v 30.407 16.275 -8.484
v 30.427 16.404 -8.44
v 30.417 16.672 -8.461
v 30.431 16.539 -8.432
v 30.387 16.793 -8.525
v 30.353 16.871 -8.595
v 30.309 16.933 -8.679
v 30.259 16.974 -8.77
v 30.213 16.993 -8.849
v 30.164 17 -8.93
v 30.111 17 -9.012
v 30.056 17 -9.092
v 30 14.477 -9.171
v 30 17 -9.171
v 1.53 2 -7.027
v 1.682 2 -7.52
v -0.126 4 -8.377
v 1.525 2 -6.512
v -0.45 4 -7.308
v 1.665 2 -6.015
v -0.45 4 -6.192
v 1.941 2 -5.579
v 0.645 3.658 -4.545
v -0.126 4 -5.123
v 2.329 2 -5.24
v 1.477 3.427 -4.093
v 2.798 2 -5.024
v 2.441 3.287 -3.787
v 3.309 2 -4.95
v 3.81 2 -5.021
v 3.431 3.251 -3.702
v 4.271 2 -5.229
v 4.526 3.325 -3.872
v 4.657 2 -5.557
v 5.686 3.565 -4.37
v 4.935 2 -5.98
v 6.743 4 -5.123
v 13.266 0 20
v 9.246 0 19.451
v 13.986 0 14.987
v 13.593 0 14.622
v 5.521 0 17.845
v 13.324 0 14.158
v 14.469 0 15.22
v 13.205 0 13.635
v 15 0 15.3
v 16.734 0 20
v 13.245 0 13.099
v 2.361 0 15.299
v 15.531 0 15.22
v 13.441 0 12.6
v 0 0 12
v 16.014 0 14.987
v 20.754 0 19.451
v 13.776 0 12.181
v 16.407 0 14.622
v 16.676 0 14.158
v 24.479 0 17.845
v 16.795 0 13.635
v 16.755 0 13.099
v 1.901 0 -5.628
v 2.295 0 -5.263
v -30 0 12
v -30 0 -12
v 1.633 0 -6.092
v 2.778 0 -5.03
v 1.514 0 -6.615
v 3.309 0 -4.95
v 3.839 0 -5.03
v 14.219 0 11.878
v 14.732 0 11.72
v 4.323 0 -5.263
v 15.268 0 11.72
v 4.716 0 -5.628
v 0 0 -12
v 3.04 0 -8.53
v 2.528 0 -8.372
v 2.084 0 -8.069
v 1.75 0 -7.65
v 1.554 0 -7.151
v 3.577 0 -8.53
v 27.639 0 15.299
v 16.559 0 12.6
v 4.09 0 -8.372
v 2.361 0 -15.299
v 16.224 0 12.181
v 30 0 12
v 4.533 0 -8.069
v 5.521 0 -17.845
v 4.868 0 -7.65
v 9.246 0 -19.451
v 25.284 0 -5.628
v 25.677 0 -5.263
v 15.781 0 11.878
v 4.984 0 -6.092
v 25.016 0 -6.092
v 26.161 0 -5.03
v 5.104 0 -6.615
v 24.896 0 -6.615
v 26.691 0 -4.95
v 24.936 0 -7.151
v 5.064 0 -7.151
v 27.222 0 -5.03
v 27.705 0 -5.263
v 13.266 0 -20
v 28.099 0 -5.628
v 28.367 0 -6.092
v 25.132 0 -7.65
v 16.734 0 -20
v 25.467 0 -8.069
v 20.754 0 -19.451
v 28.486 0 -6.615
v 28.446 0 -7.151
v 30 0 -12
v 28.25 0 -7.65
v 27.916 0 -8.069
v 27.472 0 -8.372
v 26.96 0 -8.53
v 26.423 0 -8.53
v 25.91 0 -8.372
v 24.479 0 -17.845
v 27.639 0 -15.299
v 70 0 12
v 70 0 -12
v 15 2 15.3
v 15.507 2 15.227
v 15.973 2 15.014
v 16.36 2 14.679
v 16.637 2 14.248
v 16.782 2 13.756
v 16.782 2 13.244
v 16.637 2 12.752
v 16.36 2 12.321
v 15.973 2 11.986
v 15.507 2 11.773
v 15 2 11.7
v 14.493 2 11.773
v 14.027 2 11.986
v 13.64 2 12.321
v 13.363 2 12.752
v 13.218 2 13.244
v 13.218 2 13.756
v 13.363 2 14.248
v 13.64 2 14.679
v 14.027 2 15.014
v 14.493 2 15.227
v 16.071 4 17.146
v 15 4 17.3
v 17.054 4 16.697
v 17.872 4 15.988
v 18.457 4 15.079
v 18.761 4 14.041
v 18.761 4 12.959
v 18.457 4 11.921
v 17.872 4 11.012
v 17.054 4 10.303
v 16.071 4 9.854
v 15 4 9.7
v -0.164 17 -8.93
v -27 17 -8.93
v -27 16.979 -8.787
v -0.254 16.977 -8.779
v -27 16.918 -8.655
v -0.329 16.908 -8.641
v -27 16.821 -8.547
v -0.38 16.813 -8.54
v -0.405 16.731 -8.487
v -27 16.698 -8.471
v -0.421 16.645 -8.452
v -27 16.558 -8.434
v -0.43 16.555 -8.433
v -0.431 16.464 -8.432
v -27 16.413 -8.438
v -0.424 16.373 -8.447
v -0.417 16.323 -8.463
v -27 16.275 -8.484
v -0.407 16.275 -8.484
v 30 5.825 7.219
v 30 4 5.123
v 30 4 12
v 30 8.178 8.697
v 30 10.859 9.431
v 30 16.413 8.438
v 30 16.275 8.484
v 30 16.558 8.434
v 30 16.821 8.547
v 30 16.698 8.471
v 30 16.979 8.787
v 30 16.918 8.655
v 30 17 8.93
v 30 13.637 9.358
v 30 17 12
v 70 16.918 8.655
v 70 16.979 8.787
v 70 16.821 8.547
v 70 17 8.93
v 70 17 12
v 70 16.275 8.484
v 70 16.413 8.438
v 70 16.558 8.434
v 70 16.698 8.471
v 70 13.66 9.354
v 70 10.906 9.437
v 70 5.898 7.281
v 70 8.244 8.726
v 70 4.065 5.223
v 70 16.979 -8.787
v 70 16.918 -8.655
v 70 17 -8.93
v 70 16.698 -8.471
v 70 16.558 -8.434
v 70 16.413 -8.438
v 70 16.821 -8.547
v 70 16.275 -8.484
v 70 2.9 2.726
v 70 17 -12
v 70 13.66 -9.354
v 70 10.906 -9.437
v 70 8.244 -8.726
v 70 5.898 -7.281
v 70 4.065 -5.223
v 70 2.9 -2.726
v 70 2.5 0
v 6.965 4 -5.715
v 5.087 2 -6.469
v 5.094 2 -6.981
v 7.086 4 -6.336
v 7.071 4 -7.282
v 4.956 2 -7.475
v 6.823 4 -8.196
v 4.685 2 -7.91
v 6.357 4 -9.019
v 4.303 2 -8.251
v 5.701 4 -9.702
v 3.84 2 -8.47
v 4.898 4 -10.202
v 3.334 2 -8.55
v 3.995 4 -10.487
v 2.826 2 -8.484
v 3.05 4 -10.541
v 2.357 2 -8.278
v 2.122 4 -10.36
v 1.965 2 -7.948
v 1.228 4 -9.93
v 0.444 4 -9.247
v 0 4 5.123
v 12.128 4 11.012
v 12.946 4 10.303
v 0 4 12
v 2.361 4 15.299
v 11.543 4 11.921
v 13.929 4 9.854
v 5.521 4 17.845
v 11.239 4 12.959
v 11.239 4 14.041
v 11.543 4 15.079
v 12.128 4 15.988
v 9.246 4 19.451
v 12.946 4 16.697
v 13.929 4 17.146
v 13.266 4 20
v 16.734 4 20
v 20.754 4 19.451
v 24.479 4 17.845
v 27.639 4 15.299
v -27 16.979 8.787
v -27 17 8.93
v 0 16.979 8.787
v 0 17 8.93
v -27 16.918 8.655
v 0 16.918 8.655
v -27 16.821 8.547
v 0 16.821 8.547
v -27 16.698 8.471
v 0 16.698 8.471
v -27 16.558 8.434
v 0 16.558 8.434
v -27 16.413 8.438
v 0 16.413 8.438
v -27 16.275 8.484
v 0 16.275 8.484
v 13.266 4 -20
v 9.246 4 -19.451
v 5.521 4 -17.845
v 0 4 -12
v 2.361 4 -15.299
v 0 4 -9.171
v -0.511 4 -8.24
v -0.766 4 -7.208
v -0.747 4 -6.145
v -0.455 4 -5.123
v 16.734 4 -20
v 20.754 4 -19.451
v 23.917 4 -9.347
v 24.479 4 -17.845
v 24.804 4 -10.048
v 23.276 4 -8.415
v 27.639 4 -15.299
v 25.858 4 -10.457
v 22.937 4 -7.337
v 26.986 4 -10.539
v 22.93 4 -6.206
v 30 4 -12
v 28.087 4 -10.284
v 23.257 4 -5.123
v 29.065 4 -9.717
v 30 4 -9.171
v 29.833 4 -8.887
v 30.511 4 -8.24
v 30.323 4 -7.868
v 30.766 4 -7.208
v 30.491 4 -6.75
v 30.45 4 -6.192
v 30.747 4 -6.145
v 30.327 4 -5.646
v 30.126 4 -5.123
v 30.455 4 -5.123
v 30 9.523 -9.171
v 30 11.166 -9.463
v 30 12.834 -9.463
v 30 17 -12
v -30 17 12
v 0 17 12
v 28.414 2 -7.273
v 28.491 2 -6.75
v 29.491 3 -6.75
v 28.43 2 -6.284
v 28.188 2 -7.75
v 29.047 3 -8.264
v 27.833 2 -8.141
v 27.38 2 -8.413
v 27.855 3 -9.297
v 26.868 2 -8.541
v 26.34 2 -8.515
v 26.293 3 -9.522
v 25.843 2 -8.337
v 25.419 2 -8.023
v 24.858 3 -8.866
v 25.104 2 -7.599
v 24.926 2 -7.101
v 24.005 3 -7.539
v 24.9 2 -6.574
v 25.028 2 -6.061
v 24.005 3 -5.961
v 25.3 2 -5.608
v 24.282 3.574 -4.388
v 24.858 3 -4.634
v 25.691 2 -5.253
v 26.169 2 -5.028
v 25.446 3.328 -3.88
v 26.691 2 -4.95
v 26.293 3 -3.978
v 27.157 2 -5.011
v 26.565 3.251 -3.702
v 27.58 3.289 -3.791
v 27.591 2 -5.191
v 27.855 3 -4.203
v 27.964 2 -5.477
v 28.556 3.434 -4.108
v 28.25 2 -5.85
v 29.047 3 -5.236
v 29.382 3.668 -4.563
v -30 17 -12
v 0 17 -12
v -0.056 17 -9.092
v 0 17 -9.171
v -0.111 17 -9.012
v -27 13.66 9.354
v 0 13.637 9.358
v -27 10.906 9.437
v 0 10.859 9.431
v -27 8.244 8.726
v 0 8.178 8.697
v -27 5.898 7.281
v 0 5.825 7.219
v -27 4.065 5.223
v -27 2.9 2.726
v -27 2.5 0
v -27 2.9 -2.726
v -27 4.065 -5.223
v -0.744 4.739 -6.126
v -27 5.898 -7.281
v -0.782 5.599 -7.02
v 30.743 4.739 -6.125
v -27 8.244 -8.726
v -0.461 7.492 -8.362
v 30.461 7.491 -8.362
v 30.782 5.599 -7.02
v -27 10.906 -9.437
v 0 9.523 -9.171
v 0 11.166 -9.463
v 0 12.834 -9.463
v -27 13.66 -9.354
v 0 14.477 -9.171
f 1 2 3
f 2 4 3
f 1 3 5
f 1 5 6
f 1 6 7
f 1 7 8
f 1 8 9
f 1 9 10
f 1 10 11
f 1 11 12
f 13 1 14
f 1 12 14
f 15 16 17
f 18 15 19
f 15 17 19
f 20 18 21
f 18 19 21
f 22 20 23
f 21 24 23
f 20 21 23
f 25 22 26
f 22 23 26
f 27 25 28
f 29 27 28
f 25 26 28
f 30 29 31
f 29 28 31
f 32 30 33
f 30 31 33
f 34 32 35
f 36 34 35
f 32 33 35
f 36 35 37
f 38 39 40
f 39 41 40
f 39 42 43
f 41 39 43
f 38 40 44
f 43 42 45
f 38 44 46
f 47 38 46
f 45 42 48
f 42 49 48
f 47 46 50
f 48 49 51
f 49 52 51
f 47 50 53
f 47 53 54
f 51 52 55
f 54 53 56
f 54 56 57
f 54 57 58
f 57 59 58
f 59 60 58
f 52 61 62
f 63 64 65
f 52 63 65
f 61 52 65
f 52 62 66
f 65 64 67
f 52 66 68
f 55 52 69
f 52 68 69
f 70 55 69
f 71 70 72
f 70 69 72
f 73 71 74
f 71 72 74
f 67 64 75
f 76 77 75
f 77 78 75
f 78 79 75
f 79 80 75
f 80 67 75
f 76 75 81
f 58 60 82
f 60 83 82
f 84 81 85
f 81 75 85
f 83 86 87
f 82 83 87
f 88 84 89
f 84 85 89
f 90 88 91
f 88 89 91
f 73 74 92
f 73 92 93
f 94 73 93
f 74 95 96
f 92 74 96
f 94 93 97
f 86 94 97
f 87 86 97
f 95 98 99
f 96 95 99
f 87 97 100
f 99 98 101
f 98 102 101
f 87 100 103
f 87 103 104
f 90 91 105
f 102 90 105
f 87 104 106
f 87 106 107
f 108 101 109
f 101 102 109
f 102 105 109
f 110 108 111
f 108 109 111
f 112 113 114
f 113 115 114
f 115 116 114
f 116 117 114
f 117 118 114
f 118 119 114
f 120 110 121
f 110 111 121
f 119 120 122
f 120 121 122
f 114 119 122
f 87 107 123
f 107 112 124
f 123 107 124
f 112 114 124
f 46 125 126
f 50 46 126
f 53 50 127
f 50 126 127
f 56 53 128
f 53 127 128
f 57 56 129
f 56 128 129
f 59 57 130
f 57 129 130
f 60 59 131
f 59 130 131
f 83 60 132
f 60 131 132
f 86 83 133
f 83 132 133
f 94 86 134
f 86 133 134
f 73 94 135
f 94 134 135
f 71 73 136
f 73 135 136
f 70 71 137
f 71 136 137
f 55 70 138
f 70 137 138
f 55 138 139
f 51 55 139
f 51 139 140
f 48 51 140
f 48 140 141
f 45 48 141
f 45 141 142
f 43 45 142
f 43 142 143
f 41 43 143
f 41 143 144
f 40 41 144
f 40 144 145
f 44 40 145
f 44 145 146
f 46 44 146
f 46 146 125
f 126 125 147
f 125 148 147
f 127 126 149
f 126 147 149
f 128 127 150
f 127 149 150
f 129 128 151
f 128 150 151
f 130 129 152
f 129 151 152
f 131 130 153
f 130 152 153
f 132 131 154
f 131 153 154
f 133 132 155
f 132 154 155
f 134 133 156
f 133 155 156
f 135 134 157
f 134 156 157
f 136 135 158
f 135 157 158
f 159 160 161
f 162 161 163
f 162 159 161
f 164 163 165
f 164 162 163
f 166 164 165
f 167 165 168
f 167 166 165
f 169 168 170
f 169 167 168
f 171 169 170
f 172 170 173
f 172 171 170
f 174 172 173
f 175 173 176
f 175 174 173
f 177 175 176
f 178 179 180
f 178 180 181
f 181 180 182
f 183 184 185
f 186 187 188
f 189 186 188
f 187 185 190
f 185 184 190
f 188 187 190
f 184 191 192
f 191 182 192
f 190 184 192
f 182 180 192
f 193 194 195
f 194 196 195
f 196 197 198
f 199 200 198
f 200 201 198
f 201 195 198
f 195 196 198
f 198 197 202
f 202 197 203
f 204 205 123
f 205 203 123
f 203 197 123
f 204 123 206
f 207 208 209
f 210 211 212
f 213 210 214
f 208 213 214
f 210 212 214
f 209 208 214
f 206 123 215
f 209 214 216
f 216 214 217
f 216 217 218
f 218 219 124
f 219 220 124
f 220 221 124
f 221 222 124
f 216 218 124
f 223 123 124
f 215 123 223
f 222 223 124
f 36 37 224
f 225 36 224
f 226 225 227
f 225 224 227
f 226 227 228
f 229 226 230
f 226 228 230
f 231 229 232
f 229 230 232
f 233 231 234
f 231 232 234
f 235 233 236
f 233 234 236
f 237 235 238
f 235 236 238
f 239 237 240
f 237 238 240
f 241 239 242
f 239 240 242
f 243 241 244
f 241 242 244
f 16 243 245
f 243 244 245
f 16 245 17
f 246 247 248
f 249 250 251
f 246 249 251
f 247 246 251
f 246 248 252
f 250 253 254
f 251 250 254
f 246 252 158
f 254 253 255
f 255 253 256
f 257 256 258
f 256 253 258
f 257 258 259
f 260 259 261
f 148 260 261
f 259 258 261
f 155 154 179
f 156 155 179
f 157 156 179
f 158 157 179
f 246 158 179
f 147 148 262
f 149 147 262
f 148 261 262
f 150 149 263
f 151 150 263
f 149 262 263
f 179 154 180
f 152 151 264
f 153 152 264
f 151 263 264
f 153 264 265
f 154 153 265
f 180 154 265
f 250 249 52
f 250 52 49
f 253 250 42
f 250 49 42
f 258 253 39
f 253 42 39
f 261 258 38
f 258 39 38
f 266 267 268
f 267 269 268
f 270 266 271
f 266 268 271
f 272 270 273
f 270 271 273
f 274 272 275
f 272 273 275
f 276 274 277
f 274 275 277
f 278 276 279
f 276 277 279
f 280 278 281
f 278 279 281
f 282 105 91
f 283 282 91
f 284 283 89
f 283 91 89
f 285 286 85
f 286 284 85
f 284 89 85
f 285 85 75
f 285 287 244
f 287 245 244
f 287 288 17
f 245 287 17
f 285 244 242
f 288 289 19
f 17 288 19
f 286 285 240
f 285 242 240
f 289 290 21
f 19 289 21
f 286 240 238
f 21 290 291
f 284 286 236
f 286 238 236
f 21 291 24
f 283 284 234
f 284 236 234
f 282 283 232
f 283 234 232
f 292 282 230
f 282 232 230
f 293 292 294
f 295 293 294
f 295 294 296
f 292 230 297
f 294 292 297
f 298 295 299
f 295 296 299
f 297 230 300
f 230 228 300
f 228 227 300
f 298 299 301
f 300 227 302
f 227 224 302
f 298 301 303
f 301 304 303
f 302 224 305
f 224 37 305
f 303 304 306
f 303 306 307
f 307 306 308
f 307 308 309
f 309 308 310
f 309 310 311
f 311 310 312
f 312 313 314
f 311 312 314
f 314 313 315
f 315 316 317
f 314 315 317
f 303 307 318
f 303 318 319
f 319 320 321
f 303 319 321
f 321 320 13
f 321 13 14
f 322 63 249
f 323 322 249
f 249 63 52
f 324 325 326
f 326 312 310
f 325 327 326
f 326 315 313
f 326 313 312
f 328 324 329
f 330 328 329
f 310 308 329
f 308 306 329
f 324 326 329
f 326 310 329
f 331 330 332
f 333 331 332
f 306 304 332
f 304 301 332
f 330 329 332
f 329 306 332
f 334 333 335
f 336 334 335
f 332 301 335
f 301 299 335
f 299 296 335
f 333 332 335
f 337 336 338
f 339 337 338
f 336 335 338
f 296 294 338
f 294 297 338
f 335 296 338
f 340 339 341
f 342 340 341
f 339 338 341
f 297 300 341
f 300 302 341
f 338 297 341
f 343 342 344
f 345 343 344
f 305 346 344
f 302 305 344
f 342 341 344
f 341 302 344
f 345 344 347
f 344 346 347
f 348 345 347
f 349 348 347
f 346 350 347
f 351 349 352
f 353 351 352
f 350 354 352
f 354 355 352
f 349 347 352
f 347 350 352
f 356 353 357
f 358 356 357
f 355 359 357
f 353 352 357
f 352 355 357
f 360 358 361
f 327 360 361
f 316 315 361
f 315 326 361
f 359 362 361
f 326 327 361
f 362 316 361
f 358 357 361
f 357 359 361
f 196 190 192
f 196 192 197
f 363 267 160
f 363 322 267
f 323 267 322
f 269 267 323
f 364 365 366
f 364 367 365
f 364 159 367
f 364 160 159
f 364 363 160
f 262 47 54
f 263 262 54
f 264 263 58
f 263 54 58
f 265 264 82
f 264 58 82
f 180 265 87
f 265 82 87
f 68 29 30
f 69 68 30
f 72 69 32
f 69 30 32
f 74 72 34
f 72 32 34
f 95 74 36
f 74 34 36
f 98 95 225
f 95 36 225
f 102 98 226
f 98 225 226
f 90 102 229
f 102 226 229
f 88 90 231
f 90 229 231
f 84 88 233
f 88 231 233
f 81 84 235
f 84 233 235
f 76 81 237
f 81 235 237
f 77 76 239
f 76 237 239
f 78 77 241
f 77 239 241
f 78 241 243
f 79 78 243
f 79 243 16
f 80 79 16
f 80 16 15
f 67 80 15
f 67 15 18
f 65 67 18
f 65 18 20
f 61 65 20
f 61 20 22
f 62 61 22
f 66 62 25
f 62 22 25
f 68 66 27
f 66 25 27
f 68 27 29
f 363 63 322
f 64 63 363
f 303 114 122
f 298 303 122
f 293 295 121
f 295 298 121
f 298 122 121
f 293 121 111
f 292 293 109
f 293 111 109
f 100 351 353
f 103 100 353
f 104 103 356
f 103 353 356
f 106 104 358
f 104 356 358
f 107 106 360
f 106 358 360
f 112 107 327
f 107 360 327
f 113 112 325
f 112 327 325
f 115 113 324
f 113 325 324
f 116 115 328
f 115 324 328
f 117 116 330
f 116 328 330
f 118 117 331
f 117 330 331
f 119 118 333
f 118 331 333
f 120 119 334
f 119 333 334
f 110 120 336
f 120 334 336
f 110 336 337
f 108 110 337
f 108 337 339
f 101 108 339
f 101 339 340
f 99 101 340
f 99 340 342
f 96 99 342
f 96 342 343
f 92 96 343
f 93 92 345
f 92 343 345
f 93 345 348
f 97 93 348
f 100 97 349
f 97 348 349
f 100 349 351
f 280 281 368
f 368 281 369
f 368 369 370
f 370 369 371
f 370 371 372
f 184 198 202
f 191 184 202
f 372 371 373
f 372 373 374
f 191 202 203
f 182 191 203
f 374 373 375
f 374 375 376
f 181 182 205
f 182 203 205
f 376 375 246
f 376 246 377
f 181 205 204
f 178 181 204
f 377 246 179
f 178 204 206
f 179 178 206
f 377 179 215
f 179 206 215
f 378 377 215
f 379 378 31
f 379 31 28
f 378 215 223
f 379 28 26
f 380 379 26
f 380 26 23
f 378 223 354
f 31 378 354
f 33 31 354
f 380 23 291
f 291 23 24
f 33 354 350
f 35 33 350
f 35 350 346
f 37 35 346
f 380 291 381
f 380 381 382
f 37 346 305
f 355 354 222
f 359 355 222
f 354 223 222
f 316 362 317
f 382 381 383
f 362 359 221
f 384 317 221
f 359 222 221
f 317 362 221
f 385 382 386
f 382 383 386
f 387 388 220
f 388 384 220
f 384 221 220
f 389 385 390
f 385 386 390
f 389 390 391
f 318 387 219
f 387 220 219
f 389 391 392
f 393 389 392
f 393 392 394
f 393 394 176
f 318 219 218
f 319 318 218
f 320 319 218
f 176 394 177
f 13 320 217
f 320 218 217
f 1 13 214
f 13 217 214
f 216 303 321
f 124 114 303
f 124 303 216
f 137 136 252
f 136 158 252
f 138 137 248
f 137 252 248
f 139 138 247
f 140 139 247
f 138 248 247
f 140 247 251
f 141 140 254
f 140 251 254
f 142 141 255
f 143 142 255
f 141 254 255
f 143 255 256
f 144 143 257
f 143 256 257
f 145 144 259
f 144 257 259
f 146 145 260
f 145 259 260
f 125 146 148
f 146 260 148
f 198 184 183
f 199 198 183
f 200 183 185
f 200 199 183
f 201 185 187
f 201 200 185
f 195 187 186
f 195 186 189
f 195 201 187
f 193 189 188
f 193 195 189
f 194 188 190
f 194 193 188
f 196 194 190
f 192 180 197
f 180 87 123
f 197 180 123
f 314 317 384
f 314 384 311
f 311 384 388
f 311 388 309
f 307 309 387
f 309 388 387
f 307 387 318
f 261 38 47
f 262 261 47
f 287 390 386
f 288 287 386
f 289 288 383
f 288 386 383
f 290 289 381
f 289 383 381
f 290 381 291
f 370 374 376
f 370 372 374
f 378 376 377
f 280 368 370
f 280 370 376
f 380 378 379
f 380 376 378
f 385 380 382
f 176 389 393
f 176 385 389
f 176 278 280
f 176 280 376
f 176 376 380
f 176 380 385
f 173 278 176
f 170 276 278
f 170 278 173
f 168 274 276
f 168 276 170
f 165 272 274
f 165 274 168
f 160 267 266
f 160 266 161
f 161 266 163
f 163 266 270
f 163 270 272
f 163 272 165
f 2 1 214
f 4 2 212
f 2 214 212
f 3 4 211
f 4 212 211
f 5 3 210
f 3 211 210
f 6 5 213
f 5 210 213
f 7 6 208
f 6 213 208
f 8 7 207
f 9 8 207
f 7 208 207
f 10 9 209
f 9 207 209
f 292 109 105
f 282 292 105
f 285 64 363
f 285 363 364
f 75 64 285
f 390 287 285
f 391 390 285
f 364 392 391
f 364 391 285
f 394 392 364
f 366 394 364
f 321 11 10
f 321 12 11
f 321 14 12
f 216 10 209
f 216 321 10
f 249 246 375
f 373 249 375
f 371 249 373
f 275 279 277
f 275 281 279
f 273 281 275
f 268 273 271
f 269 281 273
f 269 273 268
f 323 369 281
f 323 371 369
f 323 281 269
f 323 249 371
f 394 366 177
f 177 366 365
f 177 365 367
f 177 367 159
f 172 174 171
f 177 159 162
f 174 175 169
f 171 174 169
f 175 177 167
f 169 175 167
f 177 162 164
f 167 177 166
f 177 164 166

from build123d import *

# Parameters (mm, degrees)
EXTRUDE_2_DEPTH     = 4
SKETCH_7_W          = 100
SKETCH_7_H          = 24
EXTRUDE_3_DEPTH     = 13
SKETCH_8_R          = 9.5
CUT_EXTRUDE_3_DEPTH = 97
SKETCH_9_W          = 30
SKETCH_9_H          = 13
CUT_EXTRUDE_4_DEPTH = 79.822585596
SKETCH_10_R         = 1.8
CUT_EXTRUDE_5_DEPTH = 74.952687578
FILLET_3_R          = 15
FILLET_4_R          = 0.5
CUT_EXTRUDE_9_REACH = 76.76
SKETCH_11_R         = 4.1


with BuildPart() as part:
    # Эскиз6 → Бобышка-Вытянуть2 (new body)
    with BuildSketch(Plane(origin=(0, 0, 0), x_dir=(1, 0, 0), z_dir=(0, 1, 0))):
        Polygon((0, 20), (0, 12), (-30, 12), (-30, -12), (0, -12), (0, -20), (30, -20), (30, -12), (70, -12), (70, 12), (30, 12), (30, 20), align=None)
    extrude(amount=EXTRUDE_2_DEPTH)

    # Эскиз7 → Бобышка-Вытянуть3 (add)
    with BuildSketch(Plane(origin=(0, 4, 0), x_dir=(1, 0, 0), z_dir=(0, 1, 0))):
        with Locations((20, 0)):
            Rectangle(SKETCH_7_W, SKETCH_7_H)
    extrude(amount=EXTRUDE_3_DEPTH)

    # Эскиз8 → Вырез-Вытянуть3 (cut)
    with BuildSketch(Plane(origin=(70, 0, 0), x_dir=(0, 0, -1), z_dir=(1, 0, 0))):
        with Locations((0, 12)):
            Circle(SKETCH_8_R)
    extrude(amount=-CUT_EXTRUDE_3_DEPTH, mode=Mode.SUBTRACT)

    # Эскиз9 → Вырез-Вытянуть4 (cut, through all)
    with BuildSketch(Plane.XY.offset(12)):
        with Locations((15, 10.5)):
            Rectangle(SKETCH_9_W, SKETCH_9_H)
    extrude(amount=-CUT_EXTRUDE_4_DEPTH, mode=Mode.SUBTRACT)

    # Эскиз10 → Вырез-Вытянуть5 (cut, through all)
    with BuildSketch(Plane(origin=(0, 4, 0), x_dir=(1, 0, 0), z_dir=(0, 1, 0))):
        with Locations(Location((15, -13.5, 0), (0, 0, 270))):
            Circle(SKETCH_10_R)
        with Locations(Location((3.308657049, 6.75, 0), (0, 0, 270))):
            Circle(SKETCH_10_R)
        with Locations(Location((26.691342951, 6.75, 0), (0, 0, 270))):
            Circle(SKETCH_10_R)
    extrude(amount=-CUT_EXTRUDE_5_DEPTH, mode=Mode.SUBTRACT)

    # Скругление3
    # the kernel refuses this fillet: 15 mm, written as the material it takes off along each edge
    with BuildSketch(Plane(origin=(30, -33.166247904, -20), x_dir=(-1, 0, 0), z_dir=(0, 1, 0))) as fillet_3_piece_1:
        with BuildLine():
            CenterArc((13.266499161, 15), FILLET_3_R, 207.818139285, 62.181860715)
            Line((0, 8), (-0.265329983, 7.86))
            ThreePointArc((-0.265329983, 7.86), (-0.3, 4), (-0.3, 0))
            Line((-0.3, 0), (0, -0.3))
            Line((0, -0.3), (13.266499161, -0.3))
            Line((13.266499161, -0.3), (13.266499161, 0))
        make_face()
    extrude(amount=70.332495807, mode=Mode.SUBTRACT)
    with BuildSketch(Plane(origin=(0, -33.166247904, -20), x_dir=(0, 0, 1), z_dir=(0, 1, 0))) as fillet_3_piece_2:
        with BuildLine():
            CenterArc((15, 13.266499161), FILLET_3_R, 180, 62.181860715)
            Line((0, 13.266499161), (-0.3, 13.266499161))
            Line((-0.3, 13.266499161), (-0.3, 0))
            Line((-0.3, 0), (0, -0.3))
            ThreePointArc((0, -0.3), (4, -0.3), (7.86, -0.265329983))
            Line((7.86, -0.265329983), (8, 0))
        make_face()
    extrude(amount=70.332495807, mode=Mode.SUBTRACT)
    with BuildSketch(Plane(origin=(30, -33.166247904, 20), x_dir=(-1, 0, 0), z_dir=(0, 1, 0))) as fillet_3_piece_3:
        with BuildLine():
            CenterArc((13.266499161, -15), FILLET_3_R, 90, 62.181860715)
            Line((0, -8), (-0.265329983, -7.86))
            ThreePointArc((-0.265329983, -7.86), (-0.3, -4), (-0.3, 0))
            Line((-0.3, 0), (0, 0.3))
            Line((0, 0.3), (13.266499161, 0.3))
            Line((13.266499161, 0.3), (13.266499161, 0))
        make_face()
    extrude(amount=70.332495807, mode=Mode.SUBTRACT)
    with BuildSketch(Plane(origin=(0, -33.166247904, 20), x_dir=(0, 0, -1), z_dir=(0, 1, 0))) as fillet_3_piece_4:
        with BuildLine():
            CenterArc((15, -13.266499161), FILLET_3_R, 117.818139285, 62.181860715)
            Line((0, -13.266499161), (-0.3, -13.266499161))
            Line((-0.3, -13.266499161), (-0.3, 0))
            Line((-0.3, 0), (0, 0.3))
            ThreePointArc((0, 0.3), (4, 0.3), (7.86, 0.265329983))
            Line((7.86, 0.265329983), (8, 0))
        make_face()
    extrude(amount=70.332495807, mode=Mode.SUBTRACT)

    # Скругление4
    fillet_4_edges = [part.edges().sort_by_distance(p)[0] for p in [
        (50, 17, -8.077747211),
        (-13.5, 17, 8.077747211),
        (50, 17, 8.077747211),
        (-13.5, 17, -8.077747211),
    ]]
    fillet(fillet_4_edges, radius=FILLET_4_R)

    # Вырез-Вытянуть9: up to this face of the body (flat: up to its plane)
    cut_extrude_9_end = Plane(part.part.faces().sort_by_distance((15, 4, 11.690077791))[0])
    # Эскиз11 → Вырез-Вытянуть9 (cut, up to the picked face)
    with BuildSketch(Plane(origin=(0, 17, 0), x_dir=(1, 0, 0), z_dir=(0, 1, 0)), mode=Mode.PRIVATE) as cut_extrude_9_sk1:
        with Locations((15, -13.5)):
            Circle(SKETCH_11_R)
    cut_extrude_9_tool1 = split(extrude(cut_extrude_9_sk1.sketch, amount=-CUT_EXTRUDE_9_REACH, mode=Mode.PRIVATE), bisect_by=cut_extrude_9_end, keep=Keep.BOTH, mode=Mode.PRIVATE)
    # Эскиз11 → Вырез-Вытянуть9 (cut, up to the picked face)
    with BuildSketch(Plane(origin=(0, 17, 0), x_dir=(1, 0, 0), z_dir=(0, 1, 0)), mode=Mode.PRIVATE) as cut_extrude_9_sk2:
        with Locations((3.308657049, 6.75)):
            Circle(SKETCH_11_R)
    cut_extrude_9_tool2 = split(extrude(cut_extrude_9_sk2.sketch, amount=-CUT_EXTRUDE_9_REACH, mode=Mode.PRIVATE), bisect_by=cut_extrude_9_end, keep=Keep.BOTH, mode=Mode.PRIVATE)
    # Эскиз11 → Вырез-Вытянуть9 (cut, up to the picked face)
    with BuildSketch(Plane(origin=(0, 17, 0), x_dir=(1, 0, 0), z_dir=(0, 1, 0)), mode=Mode.PRIVATE) as cut_extrude_9_sk3:
        with Locations((26.691342951, 6.75)):
            Circle(SKETCH_11_R)
    cut_extrude_9_tool3 = split(extrude(cut_extrude_9_sk3.sketch, amount=-CUT_EXTRUDE_9_REACH, mode=Mode.PRIVATE), bisect_by=cut_extrude_9_end, keep=Keep.BOTH, mode=Mode.PRIVATE)
    add(cut_extrude_9_tool1.solids().sort_by(Axis((15, 17, 13.5), (0, -1, 0)))[0], mode=Mode.SUBTRACT)
    add(cut_extrude_9_tool2.solids().sort_by(Axis((3.308657, 17, -6.75), (0, -1, 0)))[0], mode=Mode.SUBTRACT)
    add(cut_extrude_9_tool3.solids().sort_by(Axis((26.691343, 17, -6.75), (0, -1, 0)))[0], mode=Mode.SUBTRACT)

    # Фаска2: read off the stored shape, not the designer's step
    # Фаска2 outline → Фаска2 (revolve, cut)
    with BuildSketch(Plane(origin=(26.691342951, 0, -6.75), x_dir=(1, 0, 0), z_dir=(0, 0, 1))):
        Polygon((1.8, 4.000001023), (1.8, 2), (3.800001023, 4.000001023), align=None)
    revolve(axis=Axis((26.691342951, 0, -6.75), (0, 1, 0)), mode=Mode.SUBTRACT)

    # Фаска1: read off the stored shape, not the designer's step
    # Фаска1: loft between two sections, ruled curve by curve
    chamfer_1_from = [
        Edge.make_three_point_arc((15, 2, 11.7), (13.2, 2, 13.5), (15, 2, 15.3)),
        Edge.make_three_point_arc((15, 2, 15.3), (16.8, 2, 13.5), (15, 2, 11.7)),
    ]
    chamfer_1_to = [
        Edge.make_three_point_arc((15, 4, 9.7), (11.2, 4, 13.5), (15, 4, 17.3)),
        Edge.make_three_point_arc((15, 4, 17.3), (18.8, 4, 13.5), (15, 4, 9.7)),
    ]
    chamfer_1 = Solid(Shell([*[Face.make_surface_from_curves(chamfer_1_from[k], chamfer_1_to[k]) for k in range(2)], Face(Wire(chamfer_1_from)), Face(Wire(chamfer_1_to))]))
    add(chamfer_1, mode=Mode.SUBTRACT)

    # Chamfer 1 2: loft between two sections, ruled curve by curve
    chamfer_1_2_from = [
        Edge.make_three_point_arc((4.935430815, 2, -5.979540971), (4.079116078, 2, -8.376773766), (1.681883283, 2, -7.520459029)),
        Edge.make_three_point_arc((1.681883283, 2, -7.520459029), (2.53819802, 2, -5.123226234), (4.935430815, 2, -5.979540971)),
    ]
    chamfer_1_2_to = [
        Edge.make_three_point_arc((6.742958145, 4.000001023, -5.123474945), (4.935182104, 4.000001023, -10.184301096), (-0.125644047, 4.000001023, -8.376525055)),
        Edge.make_three_point_arc((-0.125644047, 4.000001023, -8.376525055), (1.682131994, 4.000001023, -3.315698904), (6.742958145, 4.000001023, -5.123474945)),
    ]
    chamfer_1_2 = Solid(Shell([*[Face.make_surface_from_curves(chamfer_1_2_from[k], chamfer_1_2_to[k]) for k in range(2)], Face(Wire(chamfer_1_2_from)), Face(Wire(chamfer_1_2_to))]))
    add(chamfer_1_2, mode=Mode.SUBTRACT)


solid = part.part
